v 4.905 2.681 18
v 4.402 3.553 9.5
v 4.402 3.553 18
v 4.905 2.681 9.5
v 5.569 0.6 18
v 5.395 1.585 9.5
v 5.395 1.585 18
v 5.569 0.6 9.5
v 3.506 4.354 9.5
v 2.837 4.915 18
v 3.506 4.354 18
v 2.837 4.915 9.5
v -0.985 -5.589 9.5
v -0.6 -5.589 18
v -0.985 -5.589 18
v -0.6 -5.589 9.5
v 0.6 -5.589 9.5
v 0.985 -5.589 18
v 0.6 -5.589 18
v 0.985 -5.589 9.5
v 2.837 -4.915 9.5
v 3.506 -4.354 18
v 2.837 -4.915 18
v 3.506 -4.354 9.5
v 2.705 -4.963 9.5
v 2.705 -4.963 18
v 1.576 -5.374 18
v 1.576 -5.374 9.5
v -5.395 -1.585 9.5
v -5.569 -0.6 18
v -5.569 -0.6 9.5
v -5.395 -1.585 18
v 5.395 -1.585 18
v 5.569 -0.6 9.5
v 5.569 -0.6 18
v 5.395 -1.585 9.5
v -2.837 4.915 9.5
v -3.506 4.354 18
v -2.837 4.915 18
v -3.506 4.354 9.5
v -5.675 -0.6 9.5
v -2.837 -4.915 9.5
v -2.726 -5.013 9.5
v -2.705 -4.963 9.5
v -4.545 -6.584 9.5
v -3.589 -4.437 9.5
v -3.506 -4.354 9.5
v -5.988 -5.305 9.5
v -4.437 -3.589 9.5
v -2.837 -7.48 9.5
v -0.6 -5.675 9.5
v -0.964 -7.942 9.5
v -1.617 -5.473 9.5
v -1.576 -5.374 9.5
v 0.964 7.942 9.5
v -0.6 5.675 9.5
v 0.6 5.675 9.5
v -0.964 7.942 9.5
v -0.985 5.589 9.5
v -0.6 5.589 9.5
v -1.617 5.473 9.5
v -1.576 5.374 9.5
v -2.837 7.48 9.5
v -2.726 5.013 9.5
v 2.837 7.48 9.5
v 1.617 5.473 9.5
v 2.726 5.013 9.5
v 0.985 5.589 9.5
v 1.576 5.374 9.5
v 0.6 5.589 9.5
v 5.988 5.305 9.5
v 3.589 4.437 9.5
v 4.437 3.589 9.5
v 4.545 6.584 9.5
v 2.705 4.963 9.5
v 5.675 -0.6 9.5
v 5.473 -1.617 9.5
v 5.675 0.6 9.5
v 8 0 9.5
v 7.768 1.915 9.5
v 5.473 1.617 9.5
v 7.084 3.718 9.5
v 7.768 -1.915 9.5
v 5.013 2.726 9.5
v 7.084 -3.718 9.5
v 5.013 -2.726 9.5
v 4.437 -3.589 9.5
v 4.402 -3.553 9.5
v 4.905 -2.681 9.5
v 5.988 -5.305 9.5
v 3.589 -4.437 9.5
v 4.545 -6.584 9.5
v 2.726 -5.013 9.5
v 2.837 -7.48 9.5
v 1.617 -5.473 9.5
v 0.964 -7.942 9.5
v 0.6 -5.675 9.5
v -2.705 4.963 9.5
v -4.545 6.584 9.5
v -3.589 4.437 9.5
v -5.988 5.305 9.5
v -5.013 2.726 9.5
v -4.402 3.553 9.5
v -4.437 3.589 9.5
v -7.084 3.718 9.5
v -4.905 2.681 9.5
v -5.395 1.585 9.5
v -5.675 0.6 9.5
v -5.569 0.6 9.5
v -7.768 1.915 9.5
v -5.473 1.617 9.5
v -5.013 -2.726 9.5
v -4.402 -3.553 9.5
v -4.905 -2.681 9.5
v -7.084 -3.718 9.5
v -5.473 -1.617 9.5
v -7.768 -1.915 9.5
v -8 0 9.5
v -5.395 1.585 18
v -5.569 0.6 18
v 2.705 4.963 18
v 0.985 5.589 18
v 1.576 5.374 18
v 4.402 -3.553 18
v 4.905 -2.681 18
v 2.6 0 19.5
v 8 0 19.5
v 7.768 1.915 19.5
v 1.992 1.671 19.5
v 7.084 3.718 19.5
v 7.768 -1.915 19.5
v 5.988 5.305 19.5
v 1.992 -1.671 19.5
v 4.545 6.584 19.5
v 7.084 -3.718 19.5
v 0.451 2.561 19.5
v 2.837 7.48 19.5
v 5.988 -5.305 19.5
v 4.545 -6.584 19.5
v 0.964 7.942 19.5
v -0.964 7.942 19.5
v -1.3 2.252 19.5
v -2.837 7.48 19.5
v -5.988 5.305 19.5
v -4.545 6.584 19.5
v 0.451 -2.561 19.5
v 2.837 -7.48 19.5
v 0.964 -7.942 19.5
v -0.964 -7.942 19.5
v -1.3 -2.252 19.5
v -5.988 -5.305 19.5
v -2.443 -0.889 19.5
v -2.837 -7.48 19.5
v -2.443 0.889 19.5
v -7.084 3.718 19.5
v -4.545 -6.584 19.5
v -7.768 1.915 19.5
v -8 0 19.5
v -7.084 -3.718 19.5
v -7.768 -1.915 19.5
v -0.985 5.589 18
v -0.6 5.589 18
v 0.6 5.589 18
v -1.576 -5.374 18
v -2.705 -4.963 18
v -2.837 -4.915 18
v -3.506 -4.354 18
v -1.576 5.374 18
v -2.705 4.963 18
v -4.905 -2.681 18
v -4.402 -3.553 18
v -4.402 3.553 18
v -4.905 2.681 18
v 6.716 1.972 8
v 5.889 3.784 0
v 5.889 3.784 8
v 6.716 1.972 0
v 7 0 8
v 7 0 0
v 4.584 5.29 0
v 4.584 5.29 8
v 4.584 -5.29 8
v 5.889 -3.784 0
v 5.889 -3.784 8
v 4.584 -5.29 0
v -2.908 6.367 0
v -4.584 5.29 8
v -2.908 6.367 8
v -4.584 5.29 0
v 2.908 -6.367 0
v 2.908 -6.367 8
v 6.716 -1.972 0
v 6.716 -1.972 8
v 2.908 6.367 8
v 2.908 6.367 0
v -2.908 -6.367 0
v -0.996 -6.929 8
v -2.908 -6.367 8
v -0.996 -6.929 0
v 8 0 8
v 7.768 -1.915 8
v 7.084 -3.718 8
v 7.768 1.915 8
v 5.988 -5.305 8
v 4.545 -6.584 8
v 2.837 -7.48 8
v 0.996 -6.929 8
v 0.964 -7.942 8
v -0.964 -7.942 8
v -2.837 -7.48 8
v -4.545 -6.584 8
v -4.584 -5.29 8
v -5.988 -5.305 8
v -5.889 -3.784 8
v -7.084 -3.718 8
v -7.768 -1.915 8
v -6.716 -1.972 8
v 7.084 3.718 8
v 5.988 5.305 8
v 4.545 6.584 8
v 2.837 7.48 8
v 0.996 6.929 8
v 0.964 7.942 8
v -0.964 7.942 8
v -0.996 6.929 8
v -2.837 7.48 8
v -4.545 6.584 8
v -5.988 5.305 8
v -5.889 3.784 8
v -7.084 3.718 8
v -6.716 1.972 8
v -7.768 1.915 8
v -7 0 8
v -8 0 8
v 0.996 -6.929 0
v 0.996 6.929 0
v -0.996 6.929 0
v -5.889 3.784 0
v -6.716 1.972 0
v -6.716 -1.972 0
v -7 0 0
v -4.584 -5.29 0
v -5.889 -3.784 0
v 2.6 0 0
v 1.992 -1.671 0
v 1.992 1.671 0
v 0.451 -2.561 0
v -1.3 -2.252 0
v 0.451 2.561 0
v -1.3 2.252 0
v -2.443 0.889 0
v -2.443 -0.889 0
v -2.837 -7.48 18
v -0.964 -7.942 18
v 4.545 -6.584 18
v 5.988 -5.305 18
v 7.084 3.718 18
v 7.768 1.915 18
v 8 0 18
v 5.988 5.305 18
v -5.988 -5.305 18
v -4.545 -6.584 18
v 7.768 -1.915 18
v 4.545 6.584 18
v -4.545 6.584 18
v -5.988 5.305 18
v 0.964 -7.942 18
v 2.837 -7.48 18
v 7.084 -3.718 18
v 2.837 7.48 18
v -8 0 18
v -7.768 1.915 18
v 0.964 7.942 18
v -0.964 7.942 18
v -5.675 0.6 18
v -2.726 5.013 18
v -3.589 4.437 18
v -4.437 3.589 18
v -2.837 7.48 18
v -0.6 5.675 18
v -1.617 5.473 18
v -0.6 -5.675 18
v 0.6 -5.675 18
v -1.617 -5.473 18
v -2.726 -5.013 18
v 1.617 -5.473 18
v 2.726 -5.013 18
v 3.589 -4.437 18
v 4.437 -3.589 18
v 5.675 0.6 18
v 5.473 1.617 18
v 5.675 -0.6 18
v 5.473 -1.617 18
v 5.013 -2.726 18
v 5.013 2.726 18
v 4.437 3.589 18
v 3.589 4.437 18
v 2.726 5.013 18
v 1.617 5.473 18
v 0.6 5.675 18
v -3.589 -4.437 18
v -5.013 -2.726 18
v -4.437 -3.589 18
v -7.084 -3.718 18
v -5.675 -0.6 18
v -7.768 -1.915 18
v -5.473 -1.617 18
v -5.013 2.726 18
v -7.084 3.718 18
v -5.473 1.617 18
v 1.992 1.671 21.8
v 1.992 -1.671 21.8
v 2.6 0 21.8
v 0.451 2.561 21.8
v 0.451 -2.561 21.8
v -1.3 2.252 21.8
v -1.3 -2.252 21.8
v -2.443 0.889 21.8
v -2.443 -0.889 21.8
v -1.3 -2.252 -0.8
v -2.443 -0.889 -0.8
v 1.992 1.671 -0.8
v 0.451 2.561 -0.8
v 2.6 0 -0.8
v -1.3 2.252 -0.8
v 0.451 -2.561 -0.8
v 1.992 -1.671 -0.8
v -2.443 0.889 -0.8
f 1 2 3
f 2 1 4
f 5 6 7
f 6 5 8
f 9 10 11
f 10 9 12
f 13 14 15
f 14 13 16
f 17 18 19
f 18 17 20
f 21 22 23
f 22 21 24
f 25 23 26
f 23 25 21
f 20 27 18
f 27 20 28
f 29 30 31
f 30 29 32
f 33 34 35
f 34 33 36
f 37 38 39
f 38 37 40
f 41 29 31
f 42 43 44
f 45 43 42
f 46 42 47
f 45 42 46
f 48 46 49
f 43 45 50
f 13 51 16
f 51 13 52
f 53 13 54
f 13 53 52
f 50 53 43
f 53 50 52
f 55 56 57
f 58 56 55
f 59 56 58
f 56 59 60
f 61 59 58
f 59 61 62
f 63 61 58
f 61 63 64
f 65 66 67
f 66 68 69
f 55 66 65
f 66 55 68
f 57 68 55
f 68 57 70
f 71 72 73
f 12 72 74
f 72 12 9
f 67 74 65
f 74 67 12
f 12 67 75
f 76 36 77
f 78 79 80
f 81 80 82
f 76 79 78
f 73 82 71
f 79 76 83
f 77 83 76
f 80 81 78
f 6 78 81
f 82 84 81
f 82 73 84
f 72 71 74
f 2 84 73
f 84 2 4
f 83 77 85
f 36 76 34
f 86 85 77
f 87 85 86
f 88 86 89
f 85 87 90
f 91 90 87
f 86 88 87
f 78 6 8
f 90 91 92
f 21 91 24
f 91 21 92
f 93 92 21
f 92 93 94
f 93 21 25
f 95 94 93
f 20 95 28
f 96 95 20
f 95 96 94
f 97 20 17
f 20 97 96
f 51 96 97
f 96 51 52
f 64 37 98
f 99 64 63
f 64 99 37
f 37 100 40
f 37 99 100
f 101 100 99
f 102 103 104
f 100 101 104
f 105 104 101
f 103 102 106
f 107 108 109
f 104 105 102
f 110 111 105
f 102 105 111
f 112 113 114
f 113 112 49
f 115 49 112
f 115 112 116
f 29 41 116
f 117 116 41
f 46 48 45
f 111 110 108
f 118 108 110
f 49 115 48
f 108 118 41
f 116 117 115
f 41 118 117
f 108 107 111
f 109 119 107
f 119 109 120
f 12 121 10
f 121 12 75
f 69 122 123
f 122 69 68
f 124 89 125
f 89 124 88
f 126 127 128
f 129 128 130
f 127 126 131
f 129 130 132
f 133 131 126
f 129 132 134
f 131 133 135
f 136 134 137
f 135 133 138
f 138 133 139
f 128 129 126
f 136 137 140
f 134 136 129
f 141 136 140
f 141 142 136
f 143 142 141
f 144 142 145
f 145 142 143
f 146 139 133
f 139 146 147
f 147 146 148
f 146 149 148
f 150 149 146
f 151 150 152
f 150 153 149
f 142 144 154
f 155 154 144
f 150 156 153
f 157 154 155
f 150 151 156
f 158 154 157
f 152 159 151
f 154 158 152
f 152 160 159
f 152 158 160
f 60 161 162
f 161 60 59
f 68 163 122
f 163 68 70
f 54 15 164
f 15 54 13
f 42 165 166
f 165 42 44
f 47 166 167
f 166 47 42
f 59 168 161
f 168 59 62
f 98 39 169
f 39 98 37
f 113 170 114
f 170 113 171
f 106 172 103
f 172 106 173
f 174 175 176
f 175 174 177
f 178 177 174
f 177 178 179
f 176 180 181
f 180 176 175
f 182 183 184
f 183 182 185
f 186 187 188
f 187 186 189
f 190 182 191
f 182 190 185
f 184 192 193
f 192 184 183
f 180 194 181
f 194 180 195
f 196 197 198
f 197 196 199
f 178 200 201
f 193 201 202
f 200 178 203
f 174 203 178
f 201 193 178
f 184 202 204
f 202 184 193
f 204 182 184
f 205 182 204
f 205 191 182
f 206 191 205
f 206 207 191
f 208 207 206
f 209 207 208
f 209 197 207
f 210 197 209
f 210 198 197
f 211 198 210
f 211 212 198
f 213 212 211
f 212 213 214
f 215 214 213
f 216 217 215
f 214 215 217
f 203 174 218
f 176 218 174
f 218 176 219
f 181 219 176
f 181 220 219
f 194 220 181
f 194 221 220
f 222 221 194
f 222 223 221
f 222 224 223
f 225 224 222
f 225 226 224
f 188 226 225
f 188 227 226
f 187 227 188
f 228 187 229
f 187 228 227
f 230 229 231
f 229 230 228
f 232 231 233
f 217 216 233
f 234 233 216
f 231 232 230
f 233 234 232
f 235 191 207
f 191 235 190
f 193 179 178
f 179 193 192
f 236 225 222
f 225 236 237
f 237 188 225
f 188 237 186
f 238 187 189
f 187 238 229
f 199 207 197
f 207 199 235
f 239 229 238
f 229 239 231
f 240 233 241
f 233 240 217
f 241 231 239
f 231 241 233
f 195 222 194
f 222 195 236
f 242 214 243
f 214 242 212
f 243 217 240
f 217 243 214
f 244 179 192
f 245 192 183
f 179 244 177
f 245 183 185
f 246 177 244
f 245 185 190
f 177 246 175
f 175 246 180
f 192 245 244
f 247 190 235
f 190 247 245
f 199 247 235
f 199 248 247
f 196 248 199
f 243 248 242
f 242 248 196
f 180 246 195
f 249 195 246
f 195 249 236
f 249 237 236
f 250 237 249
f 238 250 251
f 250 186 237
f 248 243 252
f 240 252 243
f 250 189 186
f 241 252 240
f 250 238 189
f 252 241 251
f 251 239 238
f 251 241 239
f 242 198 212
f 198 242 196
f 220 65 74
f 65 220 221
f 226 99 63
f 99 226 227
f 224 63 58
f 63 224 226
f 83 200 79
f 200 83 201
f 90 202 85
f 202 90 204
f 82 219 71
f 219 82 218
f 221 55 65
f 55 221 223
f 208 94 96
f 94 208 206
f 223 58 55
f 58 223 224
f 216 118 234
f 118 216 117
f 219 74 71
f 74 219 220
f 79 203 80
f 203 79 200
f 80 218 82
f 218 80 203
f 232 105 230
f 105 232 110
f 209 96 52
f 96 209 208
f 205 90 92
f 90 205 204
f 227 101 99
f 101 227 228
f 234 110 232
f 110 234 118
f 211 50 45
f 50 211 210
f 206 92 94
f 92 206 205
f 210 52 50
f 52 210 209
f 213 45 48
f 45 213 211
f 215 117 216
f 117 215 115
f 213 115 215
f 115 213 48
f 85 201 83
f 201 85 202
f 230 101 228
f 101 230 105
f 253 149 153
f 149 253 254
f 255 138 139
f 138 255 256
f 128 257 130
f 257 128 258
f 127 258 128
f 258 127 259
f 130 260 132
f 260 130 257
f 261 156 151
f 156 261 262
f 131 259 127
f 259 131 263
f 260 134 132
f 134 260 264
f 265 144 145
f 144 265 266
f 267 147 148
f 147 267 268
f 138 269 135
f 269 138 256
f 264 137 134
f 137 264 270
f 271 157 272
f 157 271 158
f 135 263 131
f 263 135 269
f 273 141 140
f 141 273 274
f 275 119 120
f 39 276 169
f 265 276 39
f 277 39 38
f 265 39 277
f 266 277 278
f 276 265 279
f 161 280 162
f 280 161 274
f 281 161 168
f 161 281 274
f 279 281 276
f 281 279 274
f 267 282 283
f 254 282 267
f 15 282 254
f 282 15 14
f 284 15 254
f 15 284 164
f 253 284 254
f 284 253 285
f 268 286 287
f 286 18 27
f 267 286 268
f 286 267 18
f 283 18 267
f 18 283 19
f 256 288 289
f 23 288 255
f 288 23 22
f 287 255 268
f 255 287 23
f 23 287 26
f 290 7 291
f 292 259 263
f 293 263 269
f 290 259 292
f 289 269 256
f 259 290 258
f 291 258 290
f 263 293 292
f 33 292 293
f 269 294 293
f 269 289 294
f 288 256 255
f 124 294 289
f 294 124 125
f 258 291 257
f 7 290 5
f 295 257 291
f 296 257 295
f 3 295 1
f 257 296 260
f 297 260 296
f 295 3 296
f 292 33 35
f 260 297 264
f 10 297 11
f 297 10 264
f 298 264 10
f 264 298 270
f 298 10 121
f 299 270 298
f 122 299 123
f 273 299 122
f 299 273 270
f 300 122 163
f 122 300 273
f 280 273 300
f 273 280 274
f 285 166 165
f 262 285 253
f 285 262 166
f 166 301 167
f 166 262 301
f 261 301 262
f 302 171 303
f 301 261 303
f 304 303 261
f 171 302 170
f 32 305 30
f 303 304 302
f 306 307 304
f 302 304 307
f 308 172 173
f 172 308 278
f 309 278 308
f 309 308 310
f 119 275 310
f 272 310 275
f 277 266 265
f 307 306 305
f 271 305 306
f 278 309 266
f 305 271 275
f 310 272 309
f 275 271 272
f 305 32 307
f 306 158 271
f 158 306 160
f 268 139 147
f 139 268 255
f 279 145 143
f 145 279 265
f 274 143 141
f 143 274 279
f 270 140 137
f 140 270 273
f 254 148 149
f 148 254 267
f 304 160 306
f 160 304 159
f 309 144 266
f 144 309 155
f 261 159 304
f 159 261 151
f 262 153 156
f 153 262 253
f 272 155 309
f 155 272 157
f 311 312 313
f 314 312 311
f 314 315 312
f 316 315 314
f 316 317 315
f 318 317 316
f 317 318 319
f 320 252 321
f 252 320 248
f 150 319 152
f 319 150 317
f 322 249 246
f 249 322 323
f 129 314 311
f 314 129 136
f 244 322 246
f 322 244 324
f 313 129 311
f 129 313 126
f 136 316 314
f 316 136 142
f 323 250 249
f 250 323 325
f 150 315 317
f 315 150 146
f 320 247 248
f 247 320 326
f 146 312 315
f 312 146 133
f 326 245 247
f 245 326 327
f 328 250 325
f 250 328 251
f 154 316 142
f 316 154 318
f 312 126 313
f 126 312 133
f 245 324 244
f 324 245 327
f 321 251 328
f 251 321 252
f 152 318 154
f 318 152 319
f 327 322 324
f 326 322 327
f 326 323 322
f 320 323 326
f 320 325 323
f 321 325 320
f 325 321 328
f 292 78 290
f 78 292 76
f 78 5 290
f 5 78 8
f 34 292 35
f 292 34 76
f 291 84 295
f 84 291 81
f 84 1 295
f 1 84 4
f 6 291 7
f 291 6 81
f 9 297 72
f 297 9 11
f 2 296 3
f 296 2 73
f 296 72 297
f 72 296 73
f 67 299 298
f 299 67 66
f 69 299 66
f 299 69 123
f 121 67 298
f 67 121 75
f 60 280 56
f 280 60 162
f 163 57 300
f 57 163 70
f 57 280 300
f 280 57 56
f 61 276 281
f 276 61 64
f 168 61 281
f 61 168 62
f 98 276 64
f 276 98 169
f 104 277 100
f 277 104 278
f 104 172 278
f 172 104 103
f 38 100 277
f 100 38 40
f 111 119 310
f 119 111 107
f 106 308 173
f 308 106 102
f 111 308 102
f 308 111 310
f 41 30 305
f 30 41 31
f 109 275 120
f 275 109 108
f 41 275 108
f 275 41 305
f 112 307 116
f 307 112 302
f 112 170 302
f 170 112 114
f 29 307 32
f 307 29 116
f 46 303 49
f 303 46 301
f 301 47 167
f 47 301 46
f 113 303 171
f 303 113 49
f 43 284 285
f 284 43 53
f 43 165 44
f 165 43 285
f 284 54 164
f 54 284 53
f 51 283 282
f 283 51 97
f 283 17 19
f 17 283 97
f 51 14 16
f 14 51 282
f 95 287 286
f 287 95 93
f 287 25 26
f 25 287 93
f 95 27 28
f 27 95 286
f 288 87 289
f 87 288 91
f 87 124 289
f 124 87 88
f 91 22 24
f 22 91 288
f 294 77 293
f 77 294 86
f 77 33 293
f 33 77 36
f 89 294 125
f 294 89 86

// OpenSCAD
// Parameters
tooth_count = 16; //[8:64:1]
pitch_diameter_mm = 9.75; //[5:20:0.05]
pitch_radius_mm = 4.875; //[2.5:10:0.025]
belt_pitch_mm = 2; //[1:5:0.1]
tooth_profile_standard = 2; //[1:3:1]
pulley_width_mm = 10; //[5:30:1]
bore_diameter_mm = 5; //[2:10:0.1]
hub_diameter_mm = 14; //[8:28:0.5]
hub_length_mm = 8; //[0:25:1]
flange_diameter_mm = 16; //[10:35:0.5]
flange_thickness_mm = 1.5; //[0:5:0.1]
set_screw_count = 1; //[0:2:1]
set_screw_thread = 3; //[2:6:1]
set_screw_z_offset_mm = 4; //[0:20:0.5]
tolerance_mm = 0.2; //[0:0.6:0.05]
tooth_radial_height_mm = 0.8; //[0.4:1.6:0.05]
tooth_root_relief_mm = 0.4; //[0.2:1.2:0.05]
tooth_tangential_width_mm = 1.2; //[0.6:2.5:0.05]
tooth_overlap_mm = 0.8; //[0.3:2:0.05]
connection_overlap_mm = 0.8; //[0.5:2:0.1]
set_screw_clearance_mm = 3.2; //[2.2:6.5:0.1]
set_screw_hole_length_mm = 30; //[10:80:1]

// Pulley - complete geometry
module pulley() {
  color("Silver") {
    // Toothed pulley body
    translate([0, 0, hub_length_mm + flange_thickness_mm + pulley_width_mm/2])
      cylinder(r=pitch_diameter_mm/2 + tooth_radial_height_mm, h=pulley_width_mm, center=true);

    // Hub
    translate([0, 0, hub_length_mm/2])
      cylinder(r=hub_diameter_mm/2, h=hub_length_mm, center=true);

    // Flanges
    translate([0, 0, hub_length_mm + flange_thickness_mm/2])
      cylinder(r=flange_diameter_mm/2, h=flange_thickness_mm, center=true);
    translate([0, 0, hub_length_mm + flange_thickness_mm + pulley_width_mm - flange_thickness_mm/2])
      cylinder(r=flange_diameter_mm/2, h=flange_thickness_mm, center=true);

    // Central bore
    translate([0, 0, hub_length_mm/2 + flange_thickness_mm + pulley_width_mm/2])
      cylinder(r=(bore_diameter_mm + tolerance_mm)/2, h=hub_length_mm + 2*flange_thickness_mm + pulley_width_mm + 2*connection_overlap_mm, center=true);
  }
}

// Printed Pulley Teeth From Profile
module printed_pulley_teeth_from_profile() {
  for (i = [0:tooth_count-1]) {
    rotate([0, 0, i*360/tooth_count]) {
      translate([pitch_diameter_mm/2 + tooth_radial_height_mm/2 - tooth_overlap_mm/2, 0, hub_length_mm + flange_thickness_mm + pulley_width_mm/2])
        cube([tooth_radial_height_mm + tooth_overlap_mm, tooth_tangential_width_mm, pulley_width_mm], center=true);
    }
  }
}

// Printed Pulley GT2 Teeth
module printed_pulley_GT2_teeth() {
  printed_pulley_teeth_from_profile();
}

// Printed Pulley Teeth
module printed_pulley_teeth() {
  printed_pulley_GT2_teeth();
}

// Assembly
module assembly() {
  pulley();
  printed_pulley_teeth();
}

assembly();
